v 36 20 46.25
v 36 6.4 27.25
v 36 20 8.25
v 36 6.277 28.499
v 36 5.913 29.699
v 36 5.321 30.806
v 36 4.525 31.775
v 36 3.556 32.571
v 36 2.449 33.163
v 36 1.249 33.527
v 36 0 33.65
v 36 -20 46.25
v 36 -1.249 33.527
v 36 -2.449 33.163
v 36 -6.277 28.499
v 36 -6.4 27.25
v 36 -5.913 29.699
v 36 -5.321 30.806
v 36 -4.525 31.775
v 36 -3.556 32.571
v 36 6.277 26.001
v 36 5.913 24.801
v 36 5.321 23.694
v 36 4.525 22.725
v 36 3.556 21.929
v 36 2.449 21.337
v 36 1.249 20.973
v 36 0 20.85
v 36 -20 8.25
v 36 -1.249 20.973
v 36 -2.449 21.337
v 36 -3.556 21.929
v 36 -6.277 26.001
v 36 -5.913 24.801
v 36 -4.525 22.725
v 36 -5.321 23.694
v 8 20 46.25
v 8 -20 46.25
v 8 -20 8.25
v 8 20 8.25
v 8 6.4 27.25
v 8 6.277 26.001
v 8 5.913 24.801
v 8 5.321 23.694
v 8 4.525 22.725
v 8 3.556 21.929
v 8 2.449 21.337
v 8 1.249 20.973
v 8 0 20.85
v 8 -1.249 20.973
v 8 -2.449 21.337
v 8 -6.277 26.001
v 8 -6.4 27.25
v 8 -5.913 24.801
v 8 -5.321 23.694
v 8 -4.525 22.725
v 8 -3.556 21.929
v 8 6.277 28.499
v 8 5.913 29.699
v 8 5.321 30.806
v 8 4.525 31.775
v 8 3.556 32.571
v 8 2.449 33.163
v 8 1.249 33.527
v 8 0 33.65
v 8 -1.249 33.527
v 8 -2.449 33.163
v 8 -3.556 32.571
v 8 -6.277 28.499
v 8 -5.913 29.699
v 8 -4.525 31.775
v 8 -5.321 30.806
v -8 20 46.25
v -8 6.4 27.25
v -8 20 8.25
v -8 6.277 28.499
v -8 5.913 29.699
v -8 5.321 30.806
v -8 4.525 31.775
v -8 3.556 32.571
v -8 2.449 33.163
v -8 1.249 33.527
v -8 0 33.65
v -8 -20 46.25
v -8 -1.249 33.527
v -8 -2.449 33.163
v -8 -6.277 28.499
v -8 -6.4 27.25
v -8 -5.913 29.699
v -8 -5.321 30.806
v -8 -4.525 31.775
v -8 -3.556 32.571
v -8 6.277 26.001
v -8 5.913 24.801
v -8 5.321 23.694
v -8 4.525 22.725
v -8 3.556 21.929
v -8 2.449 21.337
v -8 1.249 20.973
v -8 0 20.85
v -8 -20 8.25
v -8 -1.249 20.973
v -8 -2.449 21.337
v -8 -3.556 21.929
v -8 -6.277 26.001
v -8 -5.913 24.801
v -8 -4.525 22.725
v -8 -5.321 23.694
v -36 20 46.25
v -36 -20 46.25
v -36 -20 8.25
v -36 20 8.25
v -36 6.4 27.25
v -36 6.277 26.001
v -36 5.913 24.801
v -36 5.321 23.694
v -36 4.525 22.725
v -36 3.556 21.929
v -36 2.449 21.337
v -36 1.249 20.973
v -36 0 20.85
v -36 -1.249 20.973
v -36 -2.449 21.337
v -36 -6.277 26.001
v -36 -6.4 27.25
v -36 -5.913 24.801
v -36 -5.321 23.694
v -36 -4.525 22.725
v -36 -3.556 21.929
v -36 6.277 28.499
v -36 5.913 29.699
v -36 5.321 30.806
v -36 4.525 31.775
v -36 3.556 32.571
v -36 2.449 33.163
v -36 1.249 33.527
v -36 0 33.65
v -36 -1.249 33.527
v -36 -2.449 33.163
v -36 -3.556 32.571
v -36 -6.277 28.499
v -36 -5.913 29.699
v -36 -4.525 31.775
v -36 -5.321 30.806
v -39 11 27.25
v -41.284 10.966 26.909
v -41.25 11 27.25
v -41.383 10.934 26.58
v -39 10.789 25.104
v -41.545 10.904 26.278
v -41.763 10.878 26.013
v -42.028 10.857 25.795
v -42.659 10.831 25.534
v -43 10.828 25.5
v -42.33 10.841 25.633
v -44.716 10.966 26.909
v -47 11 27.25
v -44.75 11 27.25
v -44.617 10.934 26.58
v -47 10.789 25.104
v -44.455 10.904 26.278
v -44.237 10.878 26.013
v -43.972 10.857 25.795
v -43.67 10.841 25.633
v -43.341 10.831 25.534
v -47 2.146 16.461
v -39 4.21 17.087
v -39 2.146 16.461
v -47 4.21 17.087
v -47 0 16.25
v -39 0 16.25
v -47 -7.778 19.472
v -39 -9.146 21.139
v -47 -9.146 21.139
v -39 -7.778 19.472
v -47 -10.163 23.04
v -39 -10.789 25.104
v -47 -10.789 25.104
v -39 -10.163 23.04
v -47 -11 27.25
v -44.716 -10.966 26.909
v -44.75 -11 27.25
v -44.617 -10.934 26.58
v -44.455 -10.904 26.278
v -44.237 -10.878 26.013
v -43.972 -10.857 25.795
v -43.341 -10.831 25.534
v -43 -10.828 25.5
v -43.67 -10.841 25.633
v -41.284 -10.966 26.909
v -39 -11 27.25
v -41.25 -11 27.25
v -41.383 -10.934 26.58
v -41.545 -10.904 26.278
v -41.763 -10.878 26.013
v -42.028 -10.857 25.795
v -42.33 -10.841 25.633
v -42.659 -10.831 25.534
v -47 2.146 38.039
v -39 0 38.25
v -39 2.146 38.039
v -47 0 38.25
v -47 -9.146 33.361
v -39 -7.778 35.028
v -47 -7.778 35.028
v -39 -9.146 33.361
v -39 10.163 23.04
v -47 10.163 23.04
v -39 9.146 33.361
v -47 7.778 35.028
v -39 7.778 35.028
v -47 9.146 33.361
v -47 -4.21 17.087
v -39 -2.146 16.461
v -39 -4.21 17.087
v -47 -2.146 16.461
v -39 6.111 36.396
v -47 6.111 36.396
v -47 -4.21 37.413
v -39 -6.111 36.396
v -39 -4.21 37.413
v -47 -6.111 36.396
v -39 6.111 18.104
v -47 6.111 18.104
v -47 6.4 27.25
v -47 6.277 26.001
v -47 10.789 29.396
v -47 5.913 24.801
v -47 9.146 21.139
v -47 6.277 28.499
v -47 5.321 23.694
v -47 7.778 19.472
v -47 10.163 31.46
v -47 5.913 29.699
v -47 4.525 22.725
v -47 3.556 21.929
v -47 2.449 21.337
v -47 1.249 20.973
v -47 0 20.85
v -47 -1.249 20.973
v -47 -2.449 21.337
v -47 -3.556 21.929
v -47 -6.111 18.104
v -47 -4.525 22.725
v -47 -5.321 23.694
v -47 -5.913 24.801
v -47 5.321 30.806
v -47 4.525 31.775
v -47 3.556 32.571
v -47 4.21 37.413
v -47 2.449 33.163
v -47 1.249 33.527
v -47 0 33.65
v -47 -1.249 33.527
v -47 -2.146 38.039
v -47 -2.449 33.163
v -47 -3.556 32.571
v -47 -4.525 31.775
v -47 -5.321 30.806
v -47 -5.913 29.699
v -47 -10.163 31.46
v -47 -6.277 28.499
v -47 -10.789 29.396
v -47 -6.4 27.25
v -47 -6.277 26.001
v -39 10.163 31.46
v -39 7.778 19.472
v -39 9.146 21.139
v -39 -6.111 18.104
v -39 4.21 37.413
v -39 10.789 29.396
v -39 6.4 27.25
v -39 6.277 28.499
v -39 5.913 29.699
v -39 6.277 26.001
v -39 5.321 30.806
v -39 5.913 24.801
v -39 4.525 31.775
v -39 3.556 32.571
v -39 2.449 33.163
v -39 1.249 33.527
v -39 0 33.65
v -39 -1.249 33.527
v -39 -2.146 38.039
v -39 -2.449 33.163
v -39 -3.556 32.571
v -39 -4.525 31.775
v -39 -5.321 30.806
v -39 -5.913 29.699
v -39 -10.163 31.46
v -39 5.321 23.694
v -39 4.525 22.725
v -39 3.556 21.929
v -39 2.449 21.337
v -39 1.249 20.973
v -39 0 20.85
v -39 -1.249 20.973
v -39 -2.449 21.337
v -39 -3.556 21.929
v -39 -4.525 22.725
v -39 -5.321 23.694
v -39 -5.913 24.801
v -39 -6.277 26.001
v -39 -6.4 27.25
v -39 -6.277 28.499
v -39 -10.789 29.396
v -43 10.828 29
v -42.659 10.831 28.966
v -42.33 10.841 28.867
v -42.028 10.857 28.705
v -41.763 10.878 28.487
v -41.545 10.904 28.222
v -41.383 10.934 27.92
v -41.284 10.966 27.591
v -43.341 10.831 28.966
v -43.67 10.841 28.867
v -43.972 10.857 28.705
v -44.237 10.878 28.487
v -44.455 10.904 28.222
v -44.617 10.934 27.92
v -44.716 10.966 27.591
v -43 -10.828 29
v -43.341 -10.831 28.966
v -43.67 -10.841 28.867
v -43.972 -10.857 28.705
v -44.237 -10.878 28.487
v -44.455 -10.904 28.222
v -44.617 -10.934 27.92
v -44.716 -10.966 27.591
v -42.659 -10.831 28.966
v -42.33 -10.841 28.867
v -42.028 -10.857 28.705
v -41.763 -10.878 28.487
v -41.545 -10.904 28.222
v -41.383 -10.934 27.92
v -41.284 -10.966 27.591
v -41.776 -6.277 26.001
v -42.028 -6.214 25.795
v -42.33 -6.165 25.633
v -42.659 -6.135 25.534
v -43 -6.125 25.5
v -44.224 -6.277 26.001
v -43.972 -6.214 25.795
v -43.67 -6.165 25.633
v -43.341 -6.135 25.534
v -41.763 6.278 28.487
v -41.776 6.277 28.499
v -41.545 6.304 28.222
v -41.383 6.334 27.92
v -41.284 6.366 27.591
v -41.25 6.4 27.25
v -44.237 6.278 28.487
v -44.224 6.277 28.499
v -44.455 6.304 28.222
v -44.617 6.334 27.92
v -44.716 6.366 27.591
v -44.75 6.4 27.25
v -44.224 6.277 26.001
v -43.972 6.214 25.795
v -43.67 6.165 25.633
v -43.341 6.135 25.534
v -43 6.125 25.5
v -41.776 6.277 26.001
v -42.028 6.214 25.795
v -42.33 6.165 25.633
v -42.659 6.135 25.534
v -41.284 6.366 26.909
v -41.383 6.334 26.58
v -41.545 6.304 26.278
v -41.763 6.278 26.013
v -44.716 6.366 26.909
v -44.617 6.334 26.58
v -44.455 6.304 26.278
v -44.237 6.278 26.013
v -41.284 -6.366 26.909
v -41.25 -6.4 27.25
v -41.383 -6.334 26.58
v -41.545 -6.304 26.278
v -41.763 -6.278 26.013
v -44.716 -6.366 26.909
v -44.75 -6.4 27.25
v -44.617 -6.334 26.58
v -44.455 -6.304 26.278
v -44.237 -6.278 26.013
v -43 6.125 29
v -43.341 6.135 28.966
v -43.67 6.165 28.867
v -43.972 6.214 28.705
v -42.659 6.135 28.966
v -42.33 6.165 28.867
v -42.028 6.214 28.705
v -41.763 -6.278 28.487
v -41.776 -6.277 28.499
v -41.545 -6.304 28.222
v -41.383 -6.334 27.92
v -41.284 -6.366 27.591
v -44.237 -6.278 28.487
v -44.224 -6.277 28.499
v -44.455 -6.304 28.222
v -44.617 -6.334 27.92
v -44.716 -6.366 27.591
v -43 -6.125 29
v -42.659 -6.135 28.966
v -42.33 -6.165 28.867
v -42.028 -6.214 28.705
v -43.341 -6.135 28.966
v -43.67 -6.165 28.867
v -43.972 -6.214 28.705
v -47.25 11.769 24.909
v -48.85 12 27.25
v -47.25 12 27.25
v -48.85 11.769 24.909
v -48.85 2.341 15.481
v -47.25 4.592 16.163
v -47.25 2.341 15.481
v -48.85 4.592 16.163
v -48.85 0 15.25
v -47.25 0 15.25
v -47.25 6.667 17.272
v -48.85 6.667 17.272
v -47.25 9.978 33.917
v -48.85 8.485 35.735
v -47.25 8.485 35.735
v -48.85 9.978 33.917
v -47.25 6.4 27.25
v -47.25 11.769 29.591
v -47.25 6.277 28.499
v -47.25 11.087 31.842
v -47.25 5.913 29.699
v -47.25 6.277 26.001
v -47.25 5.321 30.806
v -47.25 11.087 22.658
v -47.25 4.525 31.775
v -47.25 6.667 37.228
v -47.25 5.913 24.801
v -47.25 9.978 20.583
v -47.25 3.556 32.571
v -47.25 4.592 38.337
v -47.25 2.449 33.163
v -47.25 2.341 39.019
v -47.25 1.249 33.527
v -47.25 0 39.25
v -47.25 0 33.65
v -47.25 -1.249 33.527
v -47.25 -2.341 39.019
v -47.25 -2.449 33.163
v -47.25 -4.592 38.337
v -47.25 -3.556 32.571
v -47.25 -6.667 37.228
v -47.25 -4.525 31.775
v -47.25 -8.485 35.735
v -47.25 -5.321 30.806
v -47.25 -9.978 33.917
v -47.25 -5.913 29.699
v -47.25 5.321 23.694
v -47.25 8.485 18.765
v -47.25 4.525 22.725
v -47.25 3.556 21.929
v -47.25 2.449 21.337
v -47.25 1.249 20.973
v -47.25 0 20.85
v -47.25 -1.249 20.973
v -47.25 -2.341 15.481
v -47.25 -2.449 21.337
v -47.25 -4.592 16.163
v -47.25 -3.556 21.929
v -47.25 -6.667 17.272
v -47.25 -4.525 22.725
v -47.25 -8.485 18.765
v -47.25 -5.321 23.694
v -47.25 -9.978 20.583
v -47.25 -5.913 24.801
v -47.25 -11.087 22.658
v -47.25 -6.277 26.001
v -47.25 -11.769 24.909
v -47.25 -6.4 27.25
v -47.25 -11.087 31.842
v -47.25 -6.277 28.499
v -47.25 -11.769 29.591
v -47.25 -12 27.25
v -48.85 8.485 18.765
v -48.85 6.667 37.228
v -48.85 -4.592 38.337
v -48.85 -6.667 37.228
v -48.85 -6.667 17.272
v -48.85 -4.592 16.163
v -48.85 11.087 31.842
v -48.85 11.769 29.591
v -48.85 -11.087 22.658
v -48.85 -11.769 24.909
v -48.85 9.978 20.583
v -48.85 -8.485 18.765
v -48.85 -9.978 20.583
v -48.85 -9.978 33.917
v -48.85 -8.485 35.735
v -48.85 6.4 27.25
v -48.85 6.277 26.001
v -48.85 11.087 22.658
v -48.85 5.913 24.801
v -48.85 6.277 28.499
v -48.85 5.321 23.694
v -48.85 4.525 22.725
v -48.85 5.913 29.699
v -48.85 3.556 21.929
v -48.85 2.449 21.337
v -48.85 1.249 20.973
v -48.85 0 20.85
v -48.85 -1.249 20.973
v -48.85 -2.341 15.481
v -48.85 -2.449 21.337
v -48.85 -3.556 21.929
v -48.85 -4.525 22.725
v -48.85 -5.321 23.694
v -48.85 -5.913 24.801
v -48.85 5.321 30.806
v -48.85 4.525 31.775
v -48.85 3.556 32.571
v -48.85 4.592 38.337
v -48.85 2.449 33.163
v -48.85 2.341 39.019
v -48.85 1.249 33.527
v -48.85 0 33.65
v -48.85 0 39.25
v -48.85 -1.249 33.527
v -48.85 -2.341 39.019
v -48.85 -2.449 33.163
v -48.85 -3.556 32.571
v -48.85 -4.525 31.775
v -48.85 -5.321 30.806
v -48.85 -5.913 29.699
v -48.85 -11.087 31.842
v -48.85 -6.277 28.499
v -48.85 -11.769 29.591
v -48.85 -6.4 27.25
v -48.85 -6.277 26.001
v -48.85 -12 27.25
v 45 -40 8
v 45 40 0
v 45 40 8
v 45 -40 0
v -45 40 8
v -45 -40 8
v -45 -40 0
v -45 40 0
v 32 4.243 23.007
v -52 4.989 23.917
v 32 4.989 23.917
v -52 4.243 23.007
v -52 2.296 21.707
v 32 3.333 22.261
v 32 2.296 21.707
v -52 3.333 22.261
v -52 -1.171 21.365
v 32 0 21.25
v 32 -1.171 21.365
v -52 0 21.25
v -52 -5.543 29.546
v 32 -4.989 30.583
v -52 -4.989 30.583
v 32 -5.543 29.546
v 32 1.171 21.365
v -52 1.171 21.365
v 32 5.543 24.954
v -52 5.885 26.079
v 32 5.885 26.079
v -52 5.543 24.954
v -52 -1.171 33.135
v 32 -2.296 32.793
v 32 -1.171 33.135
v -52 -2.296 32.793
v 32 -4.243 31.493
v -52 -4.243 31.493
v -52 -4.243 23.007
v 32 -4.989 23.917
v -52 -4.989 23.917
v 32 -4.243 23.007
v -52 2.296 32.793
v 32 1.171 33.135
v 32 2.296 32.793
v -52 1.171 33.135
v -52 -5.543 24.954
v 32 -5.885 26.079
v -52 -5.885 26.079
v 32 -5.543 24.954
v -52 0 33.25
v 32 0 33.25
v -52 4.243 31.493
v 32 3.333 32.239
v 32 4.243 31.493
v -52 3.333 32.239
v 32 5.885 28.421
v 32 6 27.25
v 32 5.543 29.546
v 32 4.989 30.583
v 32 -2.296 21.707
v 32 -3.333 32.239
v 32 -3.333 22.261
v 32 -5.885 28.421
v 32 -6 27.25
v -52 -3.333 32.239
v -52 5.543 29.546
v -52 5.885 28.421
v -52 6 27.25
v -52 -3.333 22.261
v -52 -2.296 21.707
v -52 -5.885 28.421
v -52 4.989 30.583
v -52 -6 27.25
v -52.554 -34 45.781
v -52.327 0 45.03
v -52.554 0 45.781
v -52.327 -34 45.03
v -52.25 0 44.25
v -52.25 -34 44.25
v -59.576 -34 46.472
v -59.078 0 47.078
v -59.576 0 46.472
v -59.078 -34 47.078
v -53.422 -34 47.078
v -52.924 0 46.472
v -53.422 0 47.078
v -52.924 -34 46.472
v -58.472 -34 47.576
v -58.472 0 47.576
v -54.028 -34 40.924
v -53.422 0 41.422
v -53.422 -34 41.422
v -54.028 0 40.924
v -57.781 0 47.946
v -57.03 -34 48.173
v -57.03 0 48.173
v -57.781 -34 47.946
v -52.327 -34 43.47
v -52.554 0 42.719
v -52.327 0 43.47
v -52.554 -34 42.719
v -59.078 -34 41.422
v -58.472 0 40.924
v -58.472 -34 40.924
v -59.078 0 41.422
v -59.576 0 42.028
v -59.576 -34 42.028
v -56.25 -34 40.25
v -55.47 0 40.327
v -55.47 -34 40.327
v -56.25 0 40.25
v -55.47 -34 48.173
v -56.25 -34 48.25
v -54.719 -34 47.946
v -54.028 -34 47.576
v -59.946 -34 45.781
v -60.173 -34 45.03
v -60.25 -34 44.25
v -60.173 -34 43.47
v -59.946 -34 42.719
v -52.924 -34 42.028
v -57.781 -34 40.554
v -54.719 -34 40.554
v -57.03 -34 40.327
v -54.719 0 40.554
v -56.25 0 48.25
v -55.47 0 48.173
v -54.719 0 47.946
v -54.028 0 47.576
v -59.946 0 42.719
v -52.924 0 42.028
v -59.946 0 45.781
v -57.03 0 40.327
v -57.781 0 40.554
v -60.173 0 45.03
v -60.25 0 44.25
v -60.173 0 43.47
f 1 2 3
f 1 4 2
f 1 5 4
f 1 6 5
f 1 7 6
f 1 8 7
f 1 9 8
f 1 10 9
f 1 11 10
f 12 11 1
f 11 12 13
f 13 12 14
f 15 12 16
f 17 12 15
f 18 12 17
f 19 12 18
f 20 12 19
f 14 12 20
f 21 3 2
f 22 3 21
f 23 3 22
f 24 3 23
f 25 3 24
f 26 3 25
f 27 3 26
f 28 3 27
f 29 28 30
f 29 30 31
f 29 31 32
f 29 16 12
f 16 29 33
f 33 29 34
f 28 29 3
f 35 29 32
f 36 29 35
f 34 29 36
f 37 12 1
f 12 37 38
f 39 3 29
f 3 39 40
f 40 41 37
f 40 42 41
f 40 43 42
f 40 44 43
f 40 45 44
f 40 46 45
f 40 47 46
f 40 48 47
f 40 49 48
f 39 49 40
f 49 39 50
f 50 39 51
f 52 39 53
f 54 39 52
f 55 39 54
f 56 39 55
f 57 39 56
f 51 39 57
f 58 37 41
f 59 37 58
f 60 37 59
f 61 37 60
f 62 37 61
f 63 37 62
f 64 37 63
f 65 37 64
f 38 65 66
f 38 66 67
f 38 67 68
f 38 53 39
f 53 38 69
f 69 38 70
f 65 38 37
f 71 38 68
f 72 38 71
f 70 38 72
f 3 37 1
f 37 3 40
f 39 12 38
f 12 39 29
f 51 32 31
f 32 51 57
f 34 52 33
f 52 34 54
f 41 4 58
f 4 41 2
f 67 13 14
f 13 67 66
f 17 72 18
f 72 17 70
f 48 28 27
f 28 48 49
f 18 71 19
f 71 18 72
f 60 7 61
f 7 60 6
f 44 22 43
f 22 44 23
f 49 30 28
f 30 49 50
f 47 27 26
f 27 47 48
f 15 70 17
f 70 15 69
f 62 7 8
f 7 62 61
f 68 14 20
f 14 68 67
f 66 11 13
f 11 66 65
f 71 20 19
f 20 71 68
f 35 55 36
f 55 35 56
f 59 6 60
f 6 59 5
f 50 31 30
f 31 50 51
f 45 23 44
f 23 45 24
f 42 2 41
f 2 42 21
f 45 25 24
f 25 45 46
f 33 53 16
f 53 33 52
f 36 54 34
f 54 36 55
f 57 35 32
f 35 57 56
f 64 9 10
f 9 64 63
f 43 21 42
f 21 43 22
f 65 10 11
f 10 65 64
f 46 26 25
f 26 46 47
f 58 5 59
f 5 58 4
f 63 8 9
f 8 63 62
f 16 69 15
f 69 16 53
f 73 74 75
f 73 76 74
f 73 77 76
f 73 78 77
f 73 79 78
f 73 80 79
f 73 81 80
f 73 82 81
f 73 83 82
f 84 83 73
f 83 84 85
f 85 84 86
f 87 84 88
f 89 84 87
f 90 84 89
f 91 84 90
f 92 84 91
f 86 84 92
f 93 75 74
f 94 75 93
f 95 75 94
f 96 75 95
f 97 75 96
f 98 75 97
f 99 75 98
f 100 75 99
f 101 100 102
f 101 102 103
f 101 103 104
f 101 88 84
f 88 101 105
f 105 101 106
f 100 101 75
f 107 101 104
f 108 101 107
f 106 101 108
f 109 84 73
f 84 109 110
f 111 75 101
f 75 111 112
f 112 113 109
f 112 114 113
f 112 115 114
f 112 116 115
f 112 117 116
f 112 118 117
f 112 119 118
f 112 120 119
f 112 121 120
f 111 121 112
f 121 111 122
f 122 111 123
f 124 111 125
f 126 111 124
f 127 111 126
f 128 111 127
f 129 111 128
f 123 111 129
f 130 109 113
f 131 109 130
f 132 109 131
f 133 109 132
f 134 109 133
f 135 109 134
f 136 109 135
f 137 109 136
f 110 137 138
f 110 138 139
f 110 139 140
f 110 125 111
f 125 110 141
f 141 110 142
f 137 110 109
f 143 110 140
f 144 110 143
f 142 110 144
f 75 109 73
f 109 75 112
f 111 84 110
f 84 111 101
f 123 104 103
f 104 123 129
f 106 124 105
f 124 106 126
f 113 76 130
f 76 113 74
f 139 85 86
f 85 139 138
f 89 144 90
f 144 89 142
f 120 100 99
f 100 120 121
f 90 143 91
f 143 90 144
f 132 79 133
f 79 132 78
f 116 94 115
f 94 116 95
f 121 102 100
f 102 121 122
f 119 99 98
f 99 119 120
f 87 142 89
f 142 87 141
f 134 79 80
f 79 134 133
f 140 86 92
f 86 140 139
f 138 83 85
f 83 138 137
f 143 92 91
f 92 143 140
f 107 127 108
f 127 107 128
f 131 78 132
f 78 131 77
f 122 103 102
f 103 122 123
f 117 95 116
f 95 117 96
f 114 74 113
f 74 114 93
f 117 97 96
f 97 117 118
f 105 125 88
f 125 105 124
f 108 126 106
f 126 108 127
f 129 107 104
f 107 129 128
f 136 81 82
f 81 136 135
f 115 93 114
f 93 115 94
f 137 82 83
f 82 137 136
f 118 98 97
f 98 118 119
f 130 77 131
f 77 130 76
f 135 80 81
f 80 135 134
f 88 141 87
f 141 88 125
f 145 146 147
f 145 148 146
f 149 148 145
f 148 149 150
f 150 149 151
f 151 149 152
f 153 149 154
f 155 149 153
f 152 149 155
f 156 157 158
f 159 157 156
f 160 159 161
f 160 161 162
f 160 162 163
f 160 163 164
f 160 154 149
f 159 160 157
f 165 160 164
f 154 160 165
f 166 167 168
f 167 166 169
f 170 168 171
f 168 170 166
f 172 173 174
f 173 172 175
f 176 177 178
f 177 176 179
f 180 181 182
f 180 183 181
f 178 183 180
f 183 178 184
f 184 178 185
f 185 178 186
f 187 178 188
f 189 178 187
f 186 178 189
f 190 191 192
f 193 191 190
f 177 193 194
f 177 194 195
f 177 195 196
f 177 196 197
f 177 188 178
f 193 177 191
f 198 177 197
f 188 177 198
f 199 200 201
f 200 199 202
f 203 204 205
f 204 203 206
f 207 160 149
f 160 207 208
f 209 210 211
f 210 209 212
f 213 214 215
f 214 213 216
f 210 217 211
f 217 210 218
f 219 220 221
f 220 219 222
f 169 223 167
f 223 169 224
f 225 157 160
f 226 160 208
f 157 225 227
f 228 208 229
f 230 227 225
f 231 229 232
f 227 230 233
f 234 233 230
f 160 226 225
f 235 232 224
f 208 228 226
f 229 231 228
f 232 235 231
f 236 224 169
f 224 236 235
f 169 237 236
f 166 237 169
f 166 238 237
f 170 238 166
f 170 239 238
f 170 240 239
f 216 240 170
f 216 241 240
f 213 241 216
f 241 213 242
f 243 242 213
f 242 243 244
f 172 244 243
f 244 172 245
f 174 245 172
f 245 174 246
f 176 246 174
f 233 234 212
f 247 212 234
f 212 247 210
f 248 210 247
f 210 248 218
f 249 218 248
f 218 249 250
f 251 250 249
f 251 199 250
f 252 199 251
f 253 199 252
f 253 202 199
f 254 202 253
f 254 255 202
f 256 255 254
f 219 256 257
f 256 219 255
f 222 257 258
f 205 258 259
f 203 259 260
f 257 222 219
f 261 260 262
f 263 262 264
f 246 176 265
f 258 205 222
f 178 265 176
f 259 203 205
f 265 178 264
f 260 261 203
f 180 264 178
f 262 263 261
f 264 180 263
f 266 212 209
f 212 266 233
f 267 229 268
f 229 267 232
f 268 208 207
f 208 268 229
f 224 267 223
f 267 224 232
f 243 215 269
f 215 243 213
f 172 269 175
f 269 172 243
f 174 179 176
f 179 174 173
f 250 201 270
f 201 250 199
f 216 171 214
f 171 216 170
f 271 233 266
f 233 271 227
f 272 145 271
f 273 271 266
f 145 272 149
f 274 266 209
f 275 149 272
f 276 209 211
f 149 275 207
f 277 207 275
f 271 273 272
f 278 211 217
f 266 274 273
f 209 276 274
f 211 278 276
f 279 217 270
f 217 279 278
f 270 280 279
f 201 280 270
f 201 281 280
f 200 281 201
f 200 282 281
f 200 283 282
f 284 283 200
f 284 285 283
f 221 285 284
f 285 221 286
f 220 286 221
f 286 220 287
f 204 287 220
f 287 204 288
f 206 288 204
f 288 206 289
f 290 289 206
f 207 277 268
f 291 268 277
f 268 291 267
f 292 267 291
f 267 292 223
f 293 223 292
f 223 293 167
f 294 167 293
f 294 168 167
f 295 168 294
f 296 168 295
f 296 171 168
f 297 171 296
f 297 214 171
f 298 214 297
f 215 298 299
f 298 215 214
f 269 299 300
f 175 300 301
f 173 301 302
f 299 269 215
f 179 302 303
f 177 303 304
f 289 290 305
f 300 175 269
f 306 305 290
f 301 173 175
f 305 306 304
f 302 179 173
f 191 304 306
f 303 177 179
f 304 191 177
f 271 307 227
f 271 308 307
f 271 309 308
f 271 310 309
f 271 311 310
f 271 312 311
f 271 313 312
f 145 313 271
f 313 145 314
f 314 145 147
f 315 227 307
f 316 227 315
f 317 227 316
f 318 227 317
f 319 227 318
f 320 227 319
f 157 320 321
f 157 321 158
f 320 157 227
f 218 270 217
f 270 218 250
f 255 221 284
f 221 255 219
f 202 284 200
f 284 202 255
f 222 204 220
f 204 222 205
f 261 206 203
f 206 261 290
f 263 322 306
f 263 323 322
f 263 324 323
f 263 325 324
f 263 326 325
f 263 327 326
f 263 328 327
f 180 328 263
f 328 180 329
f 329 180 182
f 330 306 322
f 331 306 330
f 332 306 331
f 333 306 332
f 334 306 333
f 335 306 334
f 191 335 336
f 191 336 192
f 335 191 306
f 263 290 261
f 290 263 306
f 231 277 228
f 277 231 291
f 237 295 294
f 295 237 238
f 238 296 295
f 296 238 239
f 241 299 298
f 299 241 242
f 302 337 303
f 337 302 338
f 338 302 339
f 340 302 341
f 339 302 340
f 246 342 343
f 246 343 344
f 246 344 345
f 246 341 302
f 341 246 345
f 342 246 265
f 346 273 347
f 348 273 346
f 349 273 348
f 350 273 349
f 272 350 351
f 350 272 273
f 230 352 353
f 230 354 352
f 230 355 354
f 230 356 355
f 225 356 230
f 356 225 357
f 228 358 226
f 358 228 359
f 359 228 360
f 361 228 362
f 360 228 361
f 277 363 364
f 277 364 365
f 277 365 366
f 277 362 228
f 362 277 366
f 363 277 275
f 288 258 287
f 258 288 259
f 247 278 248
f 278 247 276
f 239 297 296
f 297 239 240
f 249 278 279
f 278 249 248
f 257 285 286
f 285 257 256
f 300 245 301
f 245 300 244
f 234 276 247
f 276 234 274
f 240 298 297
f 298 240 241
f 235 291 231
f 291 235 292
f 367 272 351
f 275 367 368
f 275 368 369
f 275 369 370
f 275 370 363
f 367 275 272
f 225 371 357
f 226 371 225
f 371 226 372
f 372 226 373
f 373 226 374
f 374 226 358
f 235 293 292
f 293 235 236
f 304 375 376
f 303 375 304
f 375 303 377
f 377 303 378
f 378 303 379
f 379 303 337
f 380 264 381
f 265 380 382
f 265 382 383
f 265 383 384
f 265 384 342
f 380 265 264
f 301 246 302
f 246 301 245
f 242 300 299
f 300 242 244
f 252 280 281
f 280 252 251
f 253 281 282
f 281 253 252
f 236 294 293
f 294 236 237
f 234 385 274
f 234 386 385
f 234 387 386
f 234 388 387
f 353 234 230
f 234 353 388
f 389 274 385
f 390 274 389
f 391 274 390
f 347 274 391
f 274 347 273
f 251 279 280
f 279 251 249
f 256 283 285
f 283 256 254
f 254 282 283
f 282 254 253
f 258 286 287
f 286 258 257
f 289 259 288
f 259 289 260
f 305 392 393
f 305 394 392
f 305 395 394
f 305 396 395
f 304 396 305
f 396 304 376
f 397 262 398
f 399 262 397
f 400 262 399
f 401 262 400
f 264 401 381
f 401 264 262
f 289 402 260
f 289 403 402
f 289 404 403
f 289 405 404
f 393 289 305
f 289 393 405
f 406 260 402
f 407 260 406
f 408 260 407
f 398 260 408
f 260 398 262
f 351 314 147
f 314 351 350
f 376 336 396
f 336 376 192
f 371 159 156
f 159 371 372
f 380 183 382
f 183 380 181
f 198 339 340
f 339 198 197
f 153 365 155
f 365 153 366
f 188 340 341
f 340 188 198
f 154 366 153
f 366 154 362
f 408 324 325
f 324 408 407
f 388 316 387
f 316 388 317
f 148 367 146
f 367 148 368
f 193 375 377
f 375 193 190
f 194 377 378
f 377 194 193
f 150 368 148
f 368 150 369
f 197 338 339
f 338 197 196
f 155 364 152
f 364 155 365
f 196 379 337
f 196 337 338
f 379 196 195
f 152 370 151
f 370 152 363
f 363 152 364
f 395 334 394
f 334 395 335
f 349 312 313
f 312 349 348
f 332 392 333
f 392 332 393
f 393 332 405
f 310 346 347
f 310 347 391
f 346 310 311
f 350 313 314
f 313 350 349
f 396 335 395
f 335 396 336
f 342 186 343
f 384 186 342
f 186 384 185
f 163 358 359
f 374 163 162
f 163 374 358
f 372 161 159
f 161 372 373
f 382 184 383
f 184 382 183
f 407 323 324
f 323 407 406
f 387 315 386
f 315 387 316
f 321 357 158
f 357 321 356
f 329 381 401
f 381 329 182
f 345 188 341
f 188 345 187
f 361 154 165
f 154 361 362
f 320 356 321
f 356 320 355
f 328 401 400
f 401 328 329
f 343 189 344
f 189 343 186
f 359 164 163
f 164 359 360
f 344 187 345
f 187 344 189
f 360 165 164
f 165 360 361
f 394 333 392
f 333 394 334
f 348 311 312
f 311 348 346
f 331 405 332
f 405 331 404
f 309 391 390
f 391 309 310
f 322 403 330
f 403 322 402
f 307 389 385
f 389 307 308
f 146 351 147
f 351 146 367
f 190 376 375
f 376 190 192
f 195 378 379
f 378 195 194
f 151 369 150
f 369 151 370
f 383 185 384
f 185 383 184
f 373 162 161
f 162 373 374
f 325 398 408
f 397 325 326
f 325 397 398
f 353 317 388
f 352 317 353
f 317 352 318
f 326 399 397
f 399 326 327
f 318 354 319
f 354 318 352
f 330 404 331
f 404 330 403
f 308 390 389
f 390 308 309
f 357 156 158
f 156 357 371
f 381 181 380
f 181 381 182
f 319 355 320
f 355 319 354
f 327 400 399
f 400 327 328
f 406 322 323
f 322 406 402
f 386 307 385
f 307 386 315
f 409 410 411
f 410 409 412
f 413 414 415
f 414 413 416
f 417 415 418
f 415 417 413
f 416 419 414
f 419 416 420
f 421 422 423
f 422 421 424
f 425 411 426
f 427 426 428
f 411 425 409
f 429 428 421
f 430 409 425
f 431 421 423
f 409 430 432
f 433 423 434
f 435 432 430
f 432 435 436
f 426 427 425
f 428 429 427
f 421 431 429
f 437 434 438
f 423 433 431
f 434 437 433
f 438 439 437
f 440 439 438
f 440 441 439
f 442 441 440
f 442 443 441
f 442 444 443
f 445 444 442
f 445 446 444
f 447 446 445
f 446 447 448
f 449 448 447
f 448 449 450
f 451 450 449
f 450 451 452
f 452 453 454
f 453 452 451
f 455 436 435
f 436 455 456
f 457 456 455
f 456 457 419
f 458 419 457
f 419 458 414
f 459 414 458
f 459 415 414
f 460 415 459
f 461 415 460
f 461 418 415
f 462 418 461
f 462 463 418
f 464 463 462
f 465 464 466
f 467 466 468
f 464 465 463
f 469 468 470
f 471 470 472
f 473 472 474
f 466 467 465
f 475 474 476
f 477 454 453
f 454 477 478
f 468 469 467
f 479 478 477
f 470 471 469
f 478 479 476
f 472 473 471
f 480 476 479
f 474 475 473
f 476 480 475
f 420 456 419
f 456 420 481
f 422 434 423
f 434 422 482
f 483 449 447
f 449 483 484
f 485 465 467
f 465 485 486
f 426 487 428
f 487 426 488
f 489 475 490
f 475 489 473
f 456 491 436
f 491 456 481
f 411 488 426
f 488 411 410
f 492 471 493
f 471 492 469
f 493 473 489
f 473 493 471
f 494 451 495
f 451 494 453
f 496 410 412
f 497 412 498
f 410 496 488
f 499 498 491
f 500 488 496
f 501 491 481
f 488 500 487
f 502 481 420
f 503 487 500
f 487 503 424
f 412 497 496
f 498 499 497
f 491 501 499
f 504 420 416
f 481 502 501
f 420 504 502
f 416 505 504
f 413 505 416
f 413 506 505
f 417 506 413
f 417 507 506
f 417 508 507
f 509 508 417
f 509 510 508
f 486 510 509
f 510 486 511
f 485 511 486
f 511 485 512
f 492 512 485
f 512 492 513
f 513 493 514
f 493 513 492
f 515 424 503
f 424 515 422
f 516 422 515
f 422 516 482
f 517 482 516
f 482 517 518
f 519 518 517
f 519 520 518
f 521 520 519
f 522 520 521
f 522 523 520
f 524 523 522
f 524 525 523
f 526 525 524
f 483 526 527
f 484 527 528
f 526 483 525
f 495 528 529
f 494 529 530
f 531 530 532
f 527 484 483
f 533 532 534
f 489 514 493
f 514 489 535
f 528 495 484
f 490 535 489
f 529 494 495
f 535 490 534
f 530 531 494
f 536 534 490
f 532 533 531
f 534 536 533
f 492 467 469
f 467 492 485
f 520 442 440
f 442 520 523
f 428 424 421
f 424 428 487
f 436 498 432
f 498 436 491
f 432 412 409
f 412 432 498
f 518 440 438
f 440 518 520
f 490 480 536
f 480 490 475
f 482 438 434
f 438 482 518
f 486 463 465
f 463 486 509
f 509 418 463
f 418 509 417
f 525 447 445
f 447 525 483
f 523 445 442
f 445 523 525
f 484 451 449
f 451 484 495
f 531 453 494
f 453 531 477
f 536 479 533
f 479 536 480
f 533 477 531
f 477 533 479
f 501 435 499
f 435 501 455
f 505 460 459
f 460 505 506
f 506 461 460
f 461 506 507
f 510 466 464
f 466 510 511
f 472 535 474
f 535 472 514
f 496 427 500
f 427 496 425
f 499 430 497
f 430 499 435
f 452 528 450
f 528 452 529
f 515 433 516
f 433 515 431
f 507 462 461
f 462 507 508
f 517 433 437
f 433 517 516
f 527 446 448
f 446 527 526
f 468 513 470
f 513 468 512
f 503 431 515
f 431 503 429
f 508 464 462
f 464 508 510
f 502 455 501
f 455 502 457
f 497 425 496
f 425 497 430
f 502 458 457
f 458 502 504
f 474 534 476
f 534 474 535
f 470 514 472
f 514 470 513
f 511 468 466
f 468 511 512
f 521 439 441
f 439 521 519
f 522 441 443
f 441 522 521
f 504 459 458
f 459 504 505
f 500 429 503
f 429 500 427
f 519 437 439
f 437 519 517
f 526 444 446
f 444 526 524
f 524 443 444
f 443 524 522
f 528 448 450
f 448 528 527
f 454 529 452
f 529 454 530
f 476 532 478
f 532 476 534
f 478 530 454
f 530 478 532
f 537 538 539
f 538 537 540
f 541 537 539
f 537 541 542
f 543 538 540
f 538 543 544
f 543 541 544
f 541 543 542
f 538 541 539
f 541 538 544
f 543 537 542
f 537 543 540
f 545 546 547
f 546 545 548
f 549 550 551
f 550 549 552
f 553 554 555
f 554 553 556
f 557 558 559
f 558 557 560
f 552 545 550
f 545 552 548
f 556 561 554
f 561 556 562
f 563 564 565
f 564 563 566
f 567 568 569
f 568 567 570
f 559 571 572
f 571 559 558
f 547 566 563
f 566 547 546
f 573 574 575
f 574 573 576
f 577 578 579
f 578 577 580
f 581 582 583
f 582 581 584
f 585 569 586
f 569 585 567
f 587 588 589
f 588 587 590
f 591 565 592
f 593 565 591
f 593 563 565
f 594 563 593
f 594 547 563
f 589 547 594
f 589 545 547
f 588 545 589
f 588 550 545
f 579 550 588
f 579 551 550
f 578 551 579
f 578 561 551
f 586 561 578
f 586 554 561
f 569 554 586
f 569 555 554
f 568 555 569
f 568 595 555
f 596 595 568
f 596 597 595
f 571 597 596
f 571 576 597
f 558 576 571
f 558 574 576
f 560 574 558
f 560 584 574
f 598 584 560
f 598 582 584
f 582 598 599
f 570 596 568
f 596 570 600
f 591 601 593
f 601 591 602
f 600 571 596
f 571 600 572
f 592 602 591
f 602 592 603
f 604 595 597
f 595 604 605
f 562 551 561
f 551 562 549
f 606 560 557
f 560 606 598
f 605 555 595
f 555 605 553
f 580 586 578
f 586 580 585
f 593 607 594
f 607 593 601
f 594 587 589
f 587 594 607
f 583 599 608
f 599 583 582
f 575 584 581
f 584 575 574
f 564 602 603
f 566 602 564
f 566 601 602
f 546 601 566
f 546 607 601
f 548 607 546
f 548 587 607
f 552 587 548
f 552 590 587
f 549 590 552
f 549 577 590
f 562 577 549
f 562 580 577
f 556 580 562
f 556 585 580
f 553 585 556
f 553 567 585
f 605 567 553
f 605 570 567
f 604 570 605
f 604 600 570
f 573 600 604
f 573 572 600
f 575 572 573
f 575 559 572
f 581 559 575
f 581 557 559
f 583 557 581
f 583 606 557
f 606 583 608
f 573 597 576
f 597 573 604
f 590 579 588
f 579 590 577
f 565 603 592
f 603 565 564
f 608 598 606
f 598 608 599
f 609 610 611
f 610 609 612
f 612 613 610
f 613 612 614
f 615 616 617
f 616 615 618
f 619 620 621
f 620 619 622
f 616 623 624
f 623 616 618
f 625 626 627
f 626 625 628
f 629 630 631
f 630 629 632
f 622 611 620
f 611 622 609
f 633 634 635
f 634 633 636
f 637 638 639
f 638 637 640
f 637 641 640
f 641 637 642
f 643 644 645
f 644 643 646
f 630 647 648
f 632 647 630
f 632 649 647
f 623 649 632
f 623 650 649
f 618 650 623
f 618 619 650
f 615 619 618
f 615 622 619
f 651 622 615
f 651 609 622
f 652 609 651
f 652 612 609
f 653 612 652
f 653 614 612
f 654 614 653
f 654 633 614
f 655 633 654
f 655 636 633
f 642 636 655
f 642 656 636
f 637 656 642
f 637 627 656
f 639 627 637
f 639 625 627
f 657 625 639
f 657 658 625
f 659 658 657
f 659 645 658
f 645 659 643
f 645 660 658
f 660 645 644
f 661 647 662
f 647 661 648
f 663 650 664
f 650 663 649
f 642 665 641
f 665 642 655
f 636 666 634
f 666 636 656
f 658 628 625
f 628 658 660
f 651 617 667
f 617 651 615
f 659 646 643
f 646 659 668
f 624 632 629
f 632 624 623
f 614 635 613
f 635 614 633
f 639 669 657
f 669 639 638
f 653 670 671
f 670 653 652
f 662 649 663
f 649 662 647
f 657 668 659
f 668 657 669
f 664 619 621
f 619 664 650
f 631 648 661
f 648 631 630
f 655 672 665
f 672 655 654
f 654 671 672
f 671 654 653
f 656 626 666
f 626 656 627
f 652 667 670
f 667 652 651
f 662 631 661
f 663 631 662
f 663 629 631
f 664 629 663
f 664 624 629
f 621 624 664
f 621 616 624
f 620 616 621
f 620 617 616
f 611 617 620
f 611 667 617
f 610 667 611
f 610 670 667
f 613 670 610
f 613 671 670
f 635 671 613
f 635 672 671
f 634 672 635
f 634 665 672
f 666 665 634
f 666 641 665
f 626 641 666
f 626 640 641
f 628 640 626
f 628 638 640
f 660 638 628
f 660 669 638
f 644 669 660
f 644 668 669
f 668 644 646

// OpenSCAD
$fn = 32;

// ------------------------------------------------------------------------
// Machine vise: screw d12, jaws 28 x 38 mm
// Every part is its own module, assembly() places every instance.
// ------------------------------------------------------------------------

// --- part 1 ---
module vise_bed() {
  difference() {
    translate([-45, -40, 0]) cube([90, 80, 8]);
  }
}

// --- part 2 ---
module vise_jaw() {
  difference() {
    translate([-14, -20, 0]) cube([28, 40, 38]);
    translate([0, 0, 19]) rotate([0, 90, 0]) cylinder(h = 30, d = 12.8, center = true);
  }
}

// --- part 3 ---
module vise_screw() {
  translate([0, 0, -42]) cylinder(h = 84, d = 12);
}

// --- part 4 ---
module screw_collar() {
  difference() {
    cylinder(h = 8, d = 22);
    translate([0, 0, -1]) cylinder(h = 10, d = 12.8);
    translate([0, 0, 4]) rotate([90, 0, 0]) cylinder(h = 24, d = 3.5, center = true);
  }
}

// --- part 5 ---
module screw_washer() {
  difference() {
      translate([0, 0, 0]) cylinder(h = 1.6, d = 24);
      translate([0, 0, -1]) cylinder(h = 3.6, d = 12.8);
    }
}

// --- part 6 ---
module vise_handle() {
  cylinder(h = 34, d = 8);
}

// --- assembly ---
module assembly() {
  color([0.80, 0.24, 0.20]) translate([0, 0, 0]) rotate([0, 0, 0]) vise_bed();
  color([0.20, 0.45, 0.75]) translate([22, 0, 8.25]) rotate([0, 0, 0]) vise_jaw();
  color([0.25, 0.62, 0.32]) translate([-22, 0, 8.25]) rotate([0, 0, 0]) vise_jaw();
  color([0.92, 0.70, 0.18]) translate([-10, 0, 27.25]) rotate([0, 90, 0]) vise_screw();
  color([0.58, 0.35, 0.70]) translate([-47, 0, 27.25]) rotate([0, 90, 0]) screw_collar();
  color([0.16, 0.66, 0.66]) translate([-48.85, 0, 27.25]) rotate([0, 90, 0]) screw_washer();
  color([0.85, 0.48, 0.18]) translate([-56.25, 0, 44.25]) rotate([90, 0, 0]) vise_handle();
}

assembly();
